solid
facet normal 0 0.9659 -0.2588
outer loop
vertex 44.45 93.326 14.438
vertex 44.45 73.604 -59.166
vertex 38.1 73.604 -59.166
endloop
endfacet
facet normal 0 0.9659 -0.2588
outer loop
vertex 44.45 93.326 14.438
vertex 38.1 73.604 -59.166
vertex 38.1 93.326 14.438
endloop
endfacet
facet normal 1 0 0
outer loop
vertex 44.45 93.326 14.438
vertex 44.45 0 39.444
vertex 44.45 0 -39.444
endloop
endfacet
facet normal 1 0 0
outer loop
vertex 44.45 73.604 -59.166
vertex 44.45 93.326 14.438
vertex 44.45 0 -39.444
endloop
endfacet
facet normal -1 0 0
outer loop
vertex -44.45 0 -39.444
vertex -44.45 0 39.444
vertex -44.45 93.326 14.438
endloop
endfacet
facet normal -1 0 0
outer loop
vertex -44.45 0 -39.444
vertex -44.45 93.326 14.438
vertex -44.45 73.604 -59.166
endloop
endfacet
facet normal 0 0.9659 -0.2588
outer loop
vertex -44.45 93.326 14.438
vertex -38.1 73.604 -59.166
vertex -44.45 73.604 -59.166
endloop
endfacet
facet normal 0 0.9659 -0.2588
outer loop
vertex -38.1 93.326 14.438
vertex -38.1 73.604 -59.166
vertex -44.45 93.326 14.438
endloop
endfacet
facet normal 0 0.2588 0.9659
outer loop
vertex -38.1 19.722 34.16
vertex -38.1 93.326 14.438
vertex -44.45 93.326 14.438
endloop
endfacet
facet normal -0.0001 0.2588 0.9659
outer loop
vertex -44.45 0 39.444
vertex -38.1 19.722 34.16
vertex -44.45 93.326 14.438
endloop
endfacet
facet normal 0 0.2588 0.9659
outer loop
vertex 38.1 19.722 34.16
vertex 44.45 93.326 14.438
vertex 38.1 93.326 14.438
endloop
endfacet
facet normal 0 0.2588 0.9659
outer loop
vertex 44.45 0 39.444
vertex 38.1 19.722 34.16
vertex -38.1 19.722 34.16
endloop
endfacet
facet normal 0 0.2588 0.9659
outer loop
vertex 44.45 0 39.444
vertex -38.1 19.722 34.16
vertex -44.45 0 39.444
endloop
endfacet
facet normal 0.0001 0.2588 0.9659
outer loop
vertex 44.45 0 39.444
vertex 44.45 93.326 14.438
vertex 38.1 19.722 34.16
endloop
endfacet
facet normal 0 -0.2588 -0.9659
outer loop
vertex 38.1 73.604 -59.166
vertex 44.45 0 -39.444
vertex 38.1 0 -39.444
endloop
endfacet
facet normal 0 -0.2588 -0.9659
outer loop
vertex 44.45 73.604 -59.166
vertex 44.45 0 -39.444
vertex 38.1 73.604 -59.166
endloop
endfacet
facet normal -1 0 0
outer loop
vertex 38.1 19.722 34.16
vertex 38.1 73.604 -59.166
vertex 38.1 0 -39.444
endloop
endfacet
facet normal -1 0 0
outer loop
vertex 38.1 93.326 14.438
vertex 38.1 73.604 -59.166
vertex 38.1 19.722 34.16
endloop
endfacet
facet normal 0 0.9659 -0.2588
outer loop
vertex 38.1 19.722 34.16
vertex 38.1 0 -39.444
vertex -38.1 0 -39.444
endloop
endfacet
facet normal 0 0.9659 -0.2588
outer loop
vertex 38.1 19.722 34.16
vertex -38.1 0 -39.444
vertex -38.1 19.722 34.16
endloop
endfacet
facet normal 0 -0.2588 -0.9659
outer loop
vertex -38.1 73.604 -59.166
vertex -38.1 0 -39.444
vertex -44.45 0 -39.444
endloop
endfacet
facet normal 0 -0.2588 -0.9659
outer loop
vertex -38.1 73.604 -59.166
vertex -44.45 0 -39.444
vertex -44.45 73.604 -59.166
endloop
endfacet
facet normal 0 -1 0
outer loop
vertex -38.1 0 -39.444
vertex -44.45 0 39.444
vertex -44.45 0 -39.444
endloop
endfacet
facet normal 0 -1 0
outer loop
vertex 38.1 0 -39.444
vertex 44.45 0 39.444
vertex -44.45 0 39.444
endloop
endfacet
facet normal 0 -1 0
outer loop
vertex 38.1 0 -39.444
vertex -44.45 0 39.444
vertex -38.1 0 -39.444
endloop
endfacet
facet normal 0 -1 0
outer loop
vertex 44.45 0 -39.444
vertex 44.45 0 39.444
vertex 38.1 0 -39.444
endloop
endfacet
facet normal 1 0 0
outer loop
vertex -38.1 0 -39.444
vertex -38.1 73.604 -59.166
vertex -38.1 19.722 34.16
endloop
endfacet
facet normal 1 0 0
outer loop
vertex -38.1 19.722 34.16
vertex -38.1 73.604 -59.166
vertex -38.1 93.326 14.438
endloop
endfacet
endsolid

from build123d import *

# Parameters (mm, degrees)
BOSS_EXTRUDE1_DEPTH = 44.45
CUT_EXTRUDE1_DEPTH  = 38.1


with BuildPart() as part:
    # Sketch1 → Boss-Extrude1 (new, symmetric)
    with BuildSketch(Plane(origin=(0, 0, 0), x_dir=(0, 0, -1), z_dir=(1, 0, 0))):
        Polygon((-39.444022474, 0), (39.444022474, 0), (59.16603371, 73.603547963), (-14.437514253, 93.3255592), align=None)
    extrude(amount=BOSS_EXTRUDE1_DEPTH, both=True)

    # Sketch2 → Cut-Extrude1 (cut, symmetric)
    with BuildSketch(Plane(origin=(0, 0, 0), x_dir=(0, 0, -1), z_dir=(1, 0, 0))):
        Polygon((-34.15952549, 19.722011237), (-14.437514253, 93.3255592), (59.16603371, 73.603547963), (39.444022474, 0), align=None)
    extrude(amount=CUT_EXTRUDE1_DEPTH, both=True, mode=Mode.SUBTRACT)


solid = part.part
